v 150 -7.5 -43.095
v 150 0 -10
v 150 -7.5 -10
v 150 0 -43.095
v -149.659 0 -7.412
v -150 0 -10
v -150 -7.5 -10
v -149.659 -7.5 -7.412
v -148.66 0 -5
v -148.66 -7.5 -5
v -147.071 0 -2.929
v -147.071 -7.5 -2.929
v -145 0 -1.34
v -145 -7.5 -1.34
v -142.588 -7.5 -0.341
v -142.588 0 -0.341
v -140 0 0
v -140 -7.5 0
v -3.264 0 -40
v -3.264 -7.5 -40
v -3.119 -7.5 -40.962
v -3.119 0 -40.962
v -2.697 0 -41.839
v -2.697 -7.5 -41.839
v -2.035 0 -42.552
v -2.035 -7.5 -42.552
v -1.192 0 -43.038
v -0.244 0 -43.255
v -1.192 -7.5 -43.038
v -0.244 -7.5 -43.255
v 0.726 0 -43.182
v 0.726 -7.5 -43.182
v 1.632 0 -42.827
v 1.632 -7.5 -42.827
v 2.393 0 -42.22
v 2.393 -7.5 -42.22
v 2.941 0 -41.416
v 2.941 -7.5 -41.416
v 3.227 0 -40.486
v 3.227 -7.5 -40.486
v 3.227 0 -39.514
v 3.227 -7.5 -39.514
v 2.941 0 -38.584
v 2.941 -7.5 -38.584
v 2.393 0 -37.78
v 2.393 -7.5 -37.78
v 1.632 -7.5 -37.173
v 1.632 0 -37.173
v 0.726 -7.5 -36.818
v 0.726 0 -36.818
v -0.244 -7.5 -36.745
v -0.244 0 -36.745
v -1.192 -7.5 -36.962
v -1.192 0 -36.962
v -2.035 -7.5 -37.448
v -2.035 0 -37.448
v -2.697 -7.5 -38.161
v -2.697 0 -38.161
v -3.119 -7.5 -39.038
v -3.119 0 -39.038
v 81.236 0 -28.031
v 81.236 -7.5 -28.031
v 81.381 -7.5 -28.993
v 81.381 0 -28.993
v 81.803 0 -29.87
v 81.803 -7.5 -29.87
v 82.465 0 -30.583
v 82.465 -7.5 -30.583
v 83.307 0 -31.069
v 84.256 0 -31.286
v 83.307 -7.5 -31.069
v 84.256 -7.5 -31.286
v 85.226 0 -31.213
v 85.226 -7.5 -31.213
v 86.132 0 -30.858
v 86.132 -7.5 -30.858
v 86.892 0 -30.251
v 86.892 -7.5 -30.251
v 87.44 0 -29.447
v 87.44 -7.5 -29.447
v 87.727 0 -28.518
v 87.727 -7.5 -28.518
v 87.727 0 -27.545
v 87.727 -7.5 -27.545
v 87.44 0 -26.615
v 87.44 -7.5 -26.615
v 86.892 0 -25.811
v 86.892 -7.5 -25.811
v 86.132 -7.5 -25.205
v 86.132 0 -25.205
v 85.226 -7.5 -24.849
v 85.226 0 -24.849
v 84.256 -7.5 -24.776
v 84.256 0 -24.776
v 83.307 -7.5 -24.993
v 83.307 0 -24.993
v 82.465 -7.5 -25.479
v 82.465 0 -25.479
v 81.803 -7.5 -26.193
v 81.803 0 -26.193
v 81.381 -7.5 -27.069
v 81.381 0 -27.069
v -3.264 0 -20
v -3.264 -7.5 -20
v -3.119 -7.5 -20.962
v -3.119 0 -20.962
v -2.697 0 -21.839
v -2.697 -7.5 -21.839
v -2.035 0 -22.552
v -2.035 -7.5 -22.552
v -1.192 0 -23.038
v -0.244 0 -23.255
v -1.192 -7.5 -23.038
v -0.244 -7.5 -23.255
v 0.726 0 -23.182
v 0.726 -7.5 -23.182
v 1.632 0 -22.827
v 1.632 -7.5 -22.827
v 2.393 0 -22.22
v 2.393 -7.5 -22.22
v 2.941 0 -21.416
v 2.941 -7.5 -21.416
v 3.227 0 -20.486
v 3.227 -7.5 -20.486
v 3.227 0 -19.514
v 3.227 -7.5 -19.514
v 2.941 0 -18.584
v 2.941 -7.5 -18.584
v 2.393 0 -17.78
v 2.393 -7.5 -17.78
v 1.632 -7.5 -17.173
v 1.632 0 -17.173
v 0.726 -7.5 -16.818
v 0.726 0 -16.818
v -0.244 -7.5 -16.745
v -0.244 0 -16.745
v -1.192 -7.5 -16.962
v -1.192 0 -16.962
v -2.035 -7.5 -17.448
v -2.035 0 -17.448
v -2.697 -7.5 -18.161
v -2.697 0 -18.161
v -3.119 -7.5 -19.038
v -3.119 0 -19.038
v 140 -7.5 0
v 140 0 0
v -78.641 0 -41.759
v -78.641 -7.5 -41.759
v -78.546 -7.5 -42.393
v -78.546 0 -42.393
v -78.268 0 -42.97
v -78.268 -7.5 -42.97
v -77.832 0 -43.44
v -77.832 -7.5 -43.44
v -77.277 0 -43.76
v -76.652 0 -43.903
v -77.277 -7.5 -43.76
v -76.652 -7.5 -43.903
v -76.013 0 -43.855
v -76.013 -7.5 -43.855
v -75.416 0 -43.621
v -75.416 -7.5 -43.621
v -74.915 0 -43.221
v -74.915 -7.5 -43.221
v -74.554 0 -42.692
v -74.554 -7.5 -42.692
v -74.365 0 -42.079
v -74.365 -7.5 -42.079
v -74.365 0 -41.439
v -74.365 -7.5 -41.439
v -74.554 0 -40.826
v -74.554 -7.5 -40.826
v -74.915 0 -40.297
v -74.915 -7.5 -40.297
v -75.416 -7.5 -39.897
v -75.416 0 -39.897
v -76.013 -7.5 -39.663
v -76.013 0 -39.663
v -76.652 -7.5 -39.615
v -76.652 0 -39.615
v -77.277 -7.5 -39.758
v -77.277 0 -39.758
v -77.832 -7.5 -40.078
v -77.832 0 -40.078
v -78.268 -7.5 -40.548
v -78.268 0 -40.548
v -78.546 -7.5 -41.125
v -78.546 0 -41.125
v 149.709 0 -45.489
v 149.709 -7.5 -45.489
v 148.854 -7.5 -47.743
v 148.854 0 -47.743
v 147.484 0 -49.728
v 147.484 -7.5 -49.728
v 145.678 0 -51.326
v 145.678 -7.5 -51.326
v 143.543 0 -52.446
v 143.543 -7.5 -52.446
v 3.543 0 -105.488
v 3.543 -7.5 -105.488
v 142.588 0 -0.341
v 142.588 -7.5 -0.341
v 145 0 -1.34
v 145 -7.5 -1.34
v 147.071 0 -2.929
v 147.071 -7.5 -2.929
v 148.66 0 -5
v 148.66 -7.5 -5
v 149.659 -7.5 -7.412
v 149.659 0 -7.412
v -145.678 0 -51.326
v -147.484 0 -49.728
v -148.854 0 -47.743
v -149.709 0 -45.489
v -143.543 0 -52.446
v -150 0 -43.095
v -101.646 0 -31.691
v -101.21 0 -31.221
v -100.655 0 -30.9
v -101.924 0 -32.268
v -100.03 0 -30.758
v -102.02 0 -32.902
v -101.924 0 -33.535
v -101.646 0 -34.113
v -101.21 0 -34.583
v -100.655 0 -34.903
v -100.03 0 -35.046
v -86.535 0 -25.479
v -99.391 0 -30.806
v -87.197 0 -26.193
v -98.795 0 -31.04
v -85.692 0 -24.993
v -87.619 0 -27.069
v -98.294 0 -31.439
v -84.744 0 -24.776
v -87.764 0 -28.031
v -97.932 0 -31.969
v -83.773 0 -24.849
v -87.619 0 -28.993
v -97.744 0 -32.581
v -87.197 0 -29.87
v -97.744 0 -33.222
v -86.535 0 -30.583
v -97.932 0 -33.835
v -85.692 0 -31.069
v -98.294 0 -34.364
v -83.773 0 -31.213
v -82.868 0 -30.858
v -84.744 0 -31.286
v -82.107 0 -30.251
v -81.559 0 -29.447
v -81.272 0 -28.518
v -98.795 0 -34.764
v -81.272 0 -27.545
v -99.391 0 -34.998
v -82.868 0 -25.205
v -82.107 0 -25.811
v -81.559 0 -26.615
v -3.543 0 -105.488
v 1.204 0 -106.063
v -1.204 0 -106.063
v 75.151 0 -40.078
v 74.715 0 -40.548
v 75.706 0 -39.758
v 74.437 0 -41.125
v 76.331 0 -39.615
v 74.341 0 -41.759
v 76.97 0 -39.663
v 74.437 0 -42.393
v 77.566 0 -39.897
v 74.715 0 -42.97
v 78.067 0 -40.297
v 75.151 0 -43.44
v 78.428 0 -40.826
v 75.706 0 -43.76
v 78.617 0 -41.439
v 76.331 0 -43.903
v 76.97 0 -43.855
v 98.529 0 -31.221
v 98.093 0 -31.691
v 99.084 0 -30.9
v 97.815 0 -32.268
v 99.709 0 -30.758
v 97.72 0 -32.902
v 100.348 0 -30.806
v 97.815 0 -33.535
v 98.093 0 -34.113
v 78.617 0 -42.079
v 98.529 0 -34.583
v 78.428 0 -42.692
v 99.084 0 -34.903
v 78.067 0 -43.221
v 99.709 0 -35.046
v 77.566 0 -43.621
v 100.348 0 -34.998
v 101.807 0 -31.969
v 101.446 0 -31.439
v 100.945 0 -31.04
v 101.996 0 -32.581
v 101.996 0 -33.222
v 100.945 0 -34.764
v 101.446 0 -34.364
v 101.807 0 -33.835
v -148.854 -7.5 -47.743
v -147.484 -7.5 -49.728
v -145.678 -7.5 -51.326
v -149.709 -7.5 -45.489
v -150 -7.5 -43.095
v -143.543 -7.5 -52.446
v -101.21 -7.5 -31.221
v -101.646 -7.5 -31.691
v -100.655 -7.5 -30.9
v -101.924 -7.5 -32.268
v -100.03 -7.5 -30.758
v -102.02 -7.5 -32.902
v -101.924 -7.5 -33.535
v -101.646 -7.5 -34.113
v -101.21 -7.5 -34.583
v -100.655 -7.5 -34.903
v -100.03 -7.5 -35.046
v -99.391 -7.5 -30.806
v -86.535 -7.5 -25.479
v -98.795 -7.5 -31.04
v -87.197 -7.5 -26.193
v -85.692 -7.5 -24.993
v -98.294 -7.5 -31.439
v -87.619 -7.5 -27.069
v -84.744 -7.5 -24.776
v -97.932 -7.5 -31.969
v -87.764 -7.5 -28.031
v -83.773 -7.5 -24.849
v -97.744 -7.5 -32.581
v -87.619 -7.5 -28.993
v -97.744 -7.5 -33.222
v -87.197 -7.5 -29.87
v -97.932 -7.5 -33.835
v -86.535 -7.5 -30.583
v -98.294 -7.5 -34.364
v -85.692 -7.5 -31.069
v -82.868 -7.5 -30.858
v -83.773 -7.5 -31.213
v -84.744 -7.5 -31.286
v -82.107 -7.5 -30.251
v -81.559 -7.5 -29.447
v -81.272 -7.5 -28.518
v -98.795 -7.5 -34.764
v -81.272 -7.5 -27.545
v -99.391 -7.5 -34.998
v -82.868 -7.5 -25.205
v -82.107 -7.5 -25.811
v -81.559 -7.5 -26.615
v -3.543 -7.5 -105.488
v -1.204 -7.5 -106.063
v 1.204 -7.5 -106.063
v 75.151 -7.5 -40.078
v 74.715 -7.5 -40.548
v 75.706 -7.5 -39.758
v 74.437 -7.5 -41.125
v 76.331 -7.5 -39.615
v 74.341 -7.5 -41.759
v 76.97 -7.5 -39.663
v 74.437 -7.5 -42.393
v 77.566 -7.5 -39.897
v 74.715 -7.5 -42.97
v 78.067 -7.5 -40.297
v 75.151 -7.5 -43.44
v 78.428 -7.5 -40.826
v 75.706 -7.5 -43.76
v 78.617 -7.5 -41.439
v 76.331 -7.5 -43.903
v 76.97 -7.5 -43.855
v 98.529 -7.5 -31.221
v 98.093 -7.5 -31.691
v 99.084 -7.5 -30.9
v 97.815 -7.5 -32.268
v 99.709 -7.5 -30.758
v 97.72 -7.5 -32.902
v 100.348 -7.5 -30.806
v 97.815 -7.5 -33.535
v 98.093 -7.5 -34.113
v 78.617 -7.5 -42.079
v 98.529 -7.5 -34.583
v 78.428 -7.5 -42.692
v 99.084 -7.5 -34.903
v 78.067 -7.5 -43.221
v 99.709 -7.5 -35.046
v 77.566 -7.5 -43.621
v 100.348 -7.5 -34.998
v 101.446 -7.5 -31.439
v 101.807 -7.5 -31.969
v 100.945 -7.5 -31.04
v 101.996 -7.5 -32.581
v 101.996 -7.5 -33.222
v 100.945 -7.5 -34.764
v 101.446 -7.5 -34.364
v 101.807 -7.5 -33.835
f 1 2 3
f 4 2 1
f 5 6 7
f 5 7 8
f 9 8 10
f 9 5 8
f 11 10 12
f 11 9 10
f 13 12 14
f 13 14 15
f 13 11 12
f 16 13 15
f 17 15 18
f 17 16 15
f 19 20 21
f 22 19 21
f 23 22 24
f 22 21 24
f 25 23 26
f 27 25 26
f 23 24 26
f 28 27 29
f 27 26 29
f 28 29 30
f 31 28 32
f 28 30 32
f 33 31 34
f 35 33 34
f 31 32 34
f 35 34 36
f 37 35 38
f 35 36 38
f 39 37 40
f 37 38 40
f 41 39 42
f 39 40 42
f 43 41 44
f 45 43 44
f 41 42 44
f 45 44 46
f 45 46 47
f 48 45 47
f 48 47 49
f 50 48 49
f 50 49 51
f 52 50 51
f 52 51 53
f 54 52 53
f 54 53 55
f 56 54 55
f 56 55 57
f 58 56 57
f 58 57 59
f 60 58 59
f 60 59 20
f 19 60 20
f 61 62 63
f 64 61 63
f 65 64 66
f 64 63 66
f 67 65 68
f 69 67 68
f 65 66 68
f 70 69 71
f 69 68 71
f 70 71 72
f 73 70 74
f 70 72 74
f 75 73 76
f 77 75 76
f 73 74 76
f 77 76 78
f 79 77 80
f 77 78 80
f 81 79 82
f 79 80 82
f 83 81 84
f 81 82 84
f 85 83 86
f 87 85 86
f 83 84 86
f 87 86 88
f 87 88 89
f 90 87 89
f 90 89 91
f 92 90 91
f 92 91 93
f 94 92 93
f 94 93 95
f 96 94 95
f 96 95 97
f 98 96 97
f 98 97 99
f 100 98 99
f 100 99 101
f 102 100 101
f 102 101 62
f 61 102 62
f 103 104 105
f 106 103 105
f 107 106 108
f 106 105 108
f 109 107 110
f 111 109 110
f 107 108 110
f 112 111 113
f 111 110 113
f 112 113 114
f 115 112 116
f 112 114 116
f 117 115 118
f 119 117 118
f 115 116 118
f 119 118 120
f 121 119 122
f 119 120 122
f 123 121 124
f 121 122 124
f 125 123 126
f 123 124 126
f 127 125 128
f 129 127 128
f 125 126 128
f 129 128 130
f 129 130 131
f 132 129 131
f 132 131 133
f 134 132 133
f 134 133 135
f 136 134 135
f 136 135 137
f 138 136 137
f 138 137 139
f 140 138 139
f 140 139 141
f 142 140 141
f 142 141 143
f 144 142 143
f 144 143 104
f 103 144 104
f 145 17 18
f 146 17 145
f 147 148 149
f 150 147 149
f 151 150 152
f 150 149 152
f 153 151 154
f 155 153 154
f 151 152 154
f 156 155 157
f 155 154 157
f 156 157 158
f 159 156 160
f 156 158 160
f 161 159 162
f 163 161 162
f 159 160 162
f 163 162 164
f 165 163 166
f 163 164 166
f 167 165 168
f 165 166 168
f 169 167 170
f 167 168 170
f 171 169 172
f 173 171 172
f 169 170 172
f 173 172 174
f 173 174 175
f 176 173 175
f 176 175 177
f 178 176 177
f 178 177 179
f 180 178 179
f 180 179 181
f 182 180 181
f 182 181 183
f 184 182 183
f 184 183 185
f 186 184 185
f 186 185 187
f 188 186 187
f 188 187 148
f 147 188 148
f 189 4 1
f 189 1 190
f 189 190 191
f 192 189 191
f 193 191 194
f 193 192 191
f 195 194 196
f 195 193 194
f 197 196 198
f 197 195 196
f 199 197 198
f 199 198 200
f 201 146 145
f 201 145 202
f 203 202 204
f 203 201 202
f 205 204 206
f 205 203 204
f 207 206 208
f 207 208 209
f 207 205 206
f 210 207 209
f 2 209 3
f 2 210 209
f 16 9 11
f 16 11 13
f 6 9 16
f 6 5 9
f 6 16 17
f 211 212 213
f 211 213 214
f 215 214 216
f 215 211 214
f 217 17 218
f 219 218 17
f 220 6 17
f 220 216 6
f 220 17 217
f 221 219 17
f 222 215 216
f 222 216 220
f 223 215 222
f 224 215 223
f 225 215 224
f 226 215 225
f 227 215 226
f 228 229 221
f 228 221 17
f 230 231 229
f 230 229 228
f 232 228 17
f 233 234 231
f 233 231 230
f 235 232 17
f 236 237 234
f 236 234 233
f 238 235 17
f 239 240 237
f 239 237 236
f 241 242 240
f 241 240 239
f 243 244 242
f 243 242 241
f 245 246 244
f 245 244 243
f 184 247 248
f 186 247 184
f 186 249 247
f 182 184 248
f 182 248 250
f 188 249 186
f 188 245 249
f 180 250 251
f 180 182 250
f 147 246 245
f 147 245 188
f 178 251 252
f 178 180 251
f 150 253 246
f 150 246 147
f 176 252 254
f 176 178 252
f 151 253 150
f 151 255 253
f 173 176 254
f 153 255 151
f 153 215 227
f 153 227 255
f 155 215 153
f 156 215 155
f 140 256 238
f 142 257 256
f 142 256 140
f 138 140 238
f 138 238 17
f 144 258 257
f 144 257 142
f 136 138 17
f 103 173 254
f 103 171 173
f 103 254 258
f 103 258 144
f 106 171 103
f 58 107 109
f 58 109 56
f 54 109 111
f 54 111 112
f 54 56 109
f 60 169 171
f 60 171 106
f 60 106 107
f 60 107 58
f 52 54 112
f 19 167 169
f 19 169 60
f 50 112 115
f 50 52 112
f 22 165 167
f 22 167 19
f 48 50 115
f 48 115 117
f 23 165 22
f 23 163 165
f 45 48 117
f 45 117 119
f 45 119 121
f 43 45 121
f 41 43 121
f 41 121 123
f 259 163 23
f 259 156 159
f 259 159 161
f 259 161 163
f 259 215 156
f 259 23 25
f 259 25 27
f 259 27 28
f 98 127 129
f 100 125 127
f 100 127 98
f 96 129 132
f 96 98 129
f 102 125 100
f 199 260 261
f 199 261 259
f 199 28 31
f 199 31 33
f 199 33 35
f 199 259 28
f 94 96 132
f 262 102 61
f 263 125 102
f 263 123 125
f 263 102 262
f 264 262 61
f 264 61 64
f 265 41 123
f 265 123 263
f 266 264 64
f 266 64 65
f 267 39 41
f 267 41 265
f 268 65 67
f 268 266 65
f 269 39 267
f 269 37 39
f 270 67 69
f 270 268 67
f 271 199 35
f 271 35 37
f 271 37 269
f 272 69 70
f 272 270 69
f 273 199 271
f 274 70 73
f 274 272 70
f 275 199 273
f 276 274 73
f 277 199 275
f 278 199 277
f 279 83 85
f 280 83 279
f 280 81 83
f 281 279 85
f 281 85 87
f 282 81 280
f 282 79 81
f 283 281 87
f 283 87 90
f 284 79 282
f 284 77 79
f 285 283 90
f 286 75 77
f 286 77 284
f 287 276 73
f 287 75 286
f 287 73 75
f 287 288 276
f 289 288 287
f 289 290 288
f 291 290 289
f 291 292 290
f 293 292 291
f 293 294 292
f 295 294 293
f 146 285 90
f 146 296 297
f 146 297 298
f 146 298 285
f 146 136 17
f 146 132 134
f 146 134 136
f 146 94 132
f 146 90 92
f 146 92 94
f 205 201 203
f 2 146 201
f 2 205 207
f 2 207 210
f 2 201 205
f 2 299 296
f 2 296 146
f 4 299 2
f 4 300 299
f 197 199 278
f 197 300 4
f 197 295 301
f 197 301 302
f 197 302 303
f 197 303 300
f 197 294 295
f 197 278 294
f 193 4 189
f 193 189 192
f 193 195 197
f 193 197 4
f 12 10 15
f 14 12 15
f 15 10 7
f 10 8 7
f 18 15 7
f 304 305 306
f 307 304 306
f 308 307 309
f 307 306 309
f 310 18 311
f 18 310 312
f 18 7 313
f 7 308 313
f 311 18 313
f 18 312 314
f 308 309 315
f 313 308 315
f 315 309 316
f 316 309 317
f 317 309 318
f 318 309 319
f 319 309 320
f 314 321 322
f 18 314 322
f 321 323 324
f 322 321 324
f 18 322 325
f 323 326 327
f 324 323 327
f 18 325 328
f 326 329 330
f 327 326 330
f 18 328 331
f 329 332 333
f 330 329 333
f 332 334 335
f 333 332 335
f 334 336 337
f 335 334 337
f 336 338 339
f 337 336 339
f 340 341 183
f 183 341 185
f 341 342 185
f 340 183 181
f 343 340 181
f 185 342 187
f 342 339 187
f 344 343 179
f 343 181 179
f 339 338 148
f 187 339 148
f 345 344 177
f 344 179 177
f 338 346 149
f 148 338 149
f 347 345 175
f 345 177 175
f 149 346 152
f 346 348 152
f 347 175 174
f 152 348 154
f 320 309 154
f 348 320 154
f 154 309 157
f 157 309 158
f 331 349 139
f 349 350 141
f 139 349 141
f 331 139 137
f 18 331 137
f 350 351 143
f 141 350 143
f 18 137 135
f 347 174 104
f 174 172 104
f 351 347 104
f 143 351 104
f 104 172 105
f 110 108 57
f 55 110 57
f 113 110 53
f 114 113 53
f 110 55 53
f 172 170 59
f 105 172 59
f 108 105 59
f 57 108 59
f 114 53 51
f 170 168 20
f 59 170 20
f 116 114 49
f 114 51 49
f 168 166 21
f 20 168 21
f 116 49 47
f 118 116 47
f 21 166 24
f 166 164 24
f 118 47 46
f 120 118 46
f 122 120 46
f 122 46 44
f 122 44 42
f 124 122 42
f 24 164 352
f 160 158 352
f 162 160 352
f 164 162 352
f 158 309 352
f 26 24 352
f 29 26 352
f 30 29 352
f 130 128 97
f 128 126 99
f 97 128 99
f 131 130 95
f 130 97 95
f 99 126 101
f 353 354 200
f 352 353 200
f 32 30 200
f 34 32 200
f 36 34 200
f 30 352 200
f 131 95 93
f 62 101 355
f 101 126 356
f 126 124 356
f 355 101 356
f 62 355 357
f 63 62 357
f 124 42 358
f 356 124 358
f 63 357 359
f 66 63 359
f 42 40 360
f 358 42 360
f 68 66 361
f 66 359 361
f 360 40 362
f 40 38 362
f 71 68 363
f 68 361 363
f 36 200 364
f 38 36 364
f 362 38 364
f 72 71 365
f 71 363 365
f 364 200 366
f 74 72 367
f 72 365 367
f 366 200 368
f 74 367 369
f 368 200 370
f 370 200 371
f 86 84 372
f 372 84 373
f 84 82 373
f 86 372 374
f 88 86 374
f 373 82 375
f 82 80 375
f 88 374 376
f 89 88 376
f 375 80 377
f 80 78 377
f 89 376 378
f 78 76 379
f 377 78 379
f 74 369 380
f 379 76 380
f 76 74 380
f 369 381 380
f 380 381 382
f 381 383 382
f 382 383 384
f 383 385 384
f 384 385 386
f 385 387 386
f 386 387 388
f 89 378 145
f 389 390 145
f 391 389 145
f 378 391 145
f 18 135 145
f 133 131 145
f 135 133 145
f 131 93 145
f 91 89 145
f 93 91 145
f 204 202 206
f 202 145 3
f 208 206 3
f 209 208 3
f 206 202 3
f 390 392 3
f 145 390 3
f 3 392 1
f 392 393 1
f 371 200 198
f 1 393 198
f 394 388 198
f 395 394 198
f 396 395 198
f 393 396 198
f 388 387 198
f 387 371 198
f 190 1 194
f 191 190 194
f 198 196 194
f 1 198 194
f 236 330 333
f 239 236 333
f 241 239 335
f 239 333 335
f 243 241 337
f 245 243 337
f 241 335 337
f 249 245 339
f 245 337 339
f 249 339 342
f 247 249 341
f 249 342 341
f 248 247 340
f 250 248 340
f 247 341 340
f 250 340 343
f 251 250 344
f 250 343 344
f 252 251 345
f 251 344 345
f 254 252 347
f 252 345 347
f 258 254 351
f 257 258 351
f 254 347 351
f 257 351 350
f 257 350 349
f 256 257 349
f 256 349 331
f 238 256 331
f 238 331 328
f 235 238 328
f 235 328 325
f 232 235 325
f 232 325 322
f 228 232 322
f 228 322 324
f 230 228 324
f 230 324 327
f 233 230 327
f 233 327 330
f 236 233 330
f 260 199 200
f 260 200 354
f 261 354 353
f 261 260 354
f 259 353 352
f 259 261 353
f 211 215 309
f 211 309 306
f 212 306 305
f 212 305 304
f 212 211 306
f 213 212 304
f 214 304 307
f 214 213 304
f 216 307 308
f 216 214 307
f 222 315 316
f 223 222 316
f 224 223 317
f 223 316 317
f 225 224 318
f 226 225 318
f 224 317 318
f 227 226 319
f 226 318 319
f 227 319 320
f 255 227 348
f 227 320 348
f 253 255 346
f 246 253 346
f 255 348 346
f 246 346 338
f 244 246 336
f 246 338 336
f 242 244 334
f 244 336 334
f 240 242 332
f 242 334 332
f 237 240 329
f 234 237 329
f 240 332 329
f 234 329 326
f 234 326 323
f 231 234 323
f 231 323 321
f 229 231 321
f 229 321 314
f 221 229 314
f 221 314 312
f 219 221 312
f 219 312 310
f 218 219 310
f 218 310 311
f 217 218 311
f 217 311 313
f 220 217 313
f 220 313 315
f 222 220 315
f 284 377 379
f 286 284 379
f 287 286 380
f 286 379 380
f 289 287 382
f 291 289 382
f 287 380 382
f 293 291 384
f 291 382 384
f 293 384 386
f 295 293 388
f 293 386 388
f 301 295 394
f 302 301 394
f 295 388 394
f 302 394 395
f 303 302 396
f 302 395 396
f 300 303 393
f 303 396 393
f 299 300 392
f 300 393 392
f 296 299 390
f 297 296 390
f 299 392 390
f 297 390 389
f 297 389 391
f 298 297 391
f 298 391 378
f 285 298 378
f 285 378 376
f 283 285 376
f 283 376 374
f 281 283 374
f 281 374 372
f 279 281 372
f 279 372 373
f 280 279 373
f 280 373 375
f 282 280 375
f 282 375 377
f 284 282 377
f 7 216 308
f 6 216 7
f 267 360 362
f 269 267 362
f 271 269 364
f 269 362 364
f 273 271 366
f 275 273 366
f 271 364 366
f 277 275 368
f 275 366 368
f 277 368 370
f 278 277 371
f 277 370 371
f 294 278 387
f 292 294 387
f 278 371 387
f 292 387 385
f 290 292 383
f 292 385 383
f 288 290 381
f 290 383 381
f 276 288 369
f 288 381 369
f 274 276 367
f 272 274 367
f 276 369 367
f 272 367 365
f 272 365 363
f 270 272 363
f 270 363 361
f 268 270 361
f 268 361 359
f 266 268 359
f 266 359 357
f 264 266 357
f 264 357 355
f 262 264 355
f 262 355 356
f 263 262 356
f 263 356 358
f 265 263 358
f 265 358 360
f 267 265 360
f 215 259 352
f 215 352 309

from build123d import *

# Parameters (mm, degrees)
BOSS_EXTRUDE1_DEPTH     = 7.5
F_1_4_CLEARANCE_HOLE4_D = 6.5278
M4_CLEARANCE_HOLE1_D    = 4.3


with BuildPart() as part:
    # Sketch2 → Boss-Extrude1 (new body)
    with BuildSketch(Plane(origin=(0, 0, 0), x_dir=(1, 0, 0), z_dir=(0, 1, 0))):
        with BuildLine():
            Line((0, 0), (140, 0))
            ThreePointArc((140, 0), (147.071067812, 2.928932188), (150, 10))
            Line((150, 10), (150, 43.095020321))
            ThreePointArc((150, 43.095020321), (148.228885216, 48.777048841), (143.54291038, 52.446372418))
            Line((143.54291038, 52.446372418), (3.54291038, 105.487627635))
            ThreePointArc((3.54291038, 105.487627635), (0, 106.136275538), (-3.54291038, 105.487627635))
            Line((-3.54291038, 105.487627635), (-143.54291038, 52.446372418))
            ThreePointArc((-143.54291038, 52.446372418), (-148.228885216, 48.777048841), (-150, 43.095020321))
            Line((-150, 43.095020321), (-150, 10))
            ThreePointArc((-150, 10), (-147.071067812, 2.928932188), (-140, 0))
            Line((-140, 0), (0, 0))
        make_face()
    extrude(amount=-BOSS_EXTRUDE1_DEPTH)

    # 1/4 Clearance Hole4 (through all)
    with Locations(Plane(origin=(0, 0, 0), x_dir=(1, 0, 0), z_dir=(0, 1, 0))):
        with Locations((84.499767088, 28.031140011), (-84.499767088, 28.031140011), (0, 40), (0, 20)):
            Hole(F_1_4_CLEARANCE_HOLE4_D / 2)

    # M4 Clearance Hole1 (through all)
    with Locations(Plane(origin=(0, 0, 0), x_dir=(1, 0, 0), z_dir=(0, 1, 0))):
        with Locations((-76.49119694, 41.758956585), (-99.869577175, 32.901680638), (76.49119694, 41.758956585), (99.869577175, 32.901680638)):
            Hole(M4_CLEARANCE_HOLE1_D / 2)


solid = part.part
